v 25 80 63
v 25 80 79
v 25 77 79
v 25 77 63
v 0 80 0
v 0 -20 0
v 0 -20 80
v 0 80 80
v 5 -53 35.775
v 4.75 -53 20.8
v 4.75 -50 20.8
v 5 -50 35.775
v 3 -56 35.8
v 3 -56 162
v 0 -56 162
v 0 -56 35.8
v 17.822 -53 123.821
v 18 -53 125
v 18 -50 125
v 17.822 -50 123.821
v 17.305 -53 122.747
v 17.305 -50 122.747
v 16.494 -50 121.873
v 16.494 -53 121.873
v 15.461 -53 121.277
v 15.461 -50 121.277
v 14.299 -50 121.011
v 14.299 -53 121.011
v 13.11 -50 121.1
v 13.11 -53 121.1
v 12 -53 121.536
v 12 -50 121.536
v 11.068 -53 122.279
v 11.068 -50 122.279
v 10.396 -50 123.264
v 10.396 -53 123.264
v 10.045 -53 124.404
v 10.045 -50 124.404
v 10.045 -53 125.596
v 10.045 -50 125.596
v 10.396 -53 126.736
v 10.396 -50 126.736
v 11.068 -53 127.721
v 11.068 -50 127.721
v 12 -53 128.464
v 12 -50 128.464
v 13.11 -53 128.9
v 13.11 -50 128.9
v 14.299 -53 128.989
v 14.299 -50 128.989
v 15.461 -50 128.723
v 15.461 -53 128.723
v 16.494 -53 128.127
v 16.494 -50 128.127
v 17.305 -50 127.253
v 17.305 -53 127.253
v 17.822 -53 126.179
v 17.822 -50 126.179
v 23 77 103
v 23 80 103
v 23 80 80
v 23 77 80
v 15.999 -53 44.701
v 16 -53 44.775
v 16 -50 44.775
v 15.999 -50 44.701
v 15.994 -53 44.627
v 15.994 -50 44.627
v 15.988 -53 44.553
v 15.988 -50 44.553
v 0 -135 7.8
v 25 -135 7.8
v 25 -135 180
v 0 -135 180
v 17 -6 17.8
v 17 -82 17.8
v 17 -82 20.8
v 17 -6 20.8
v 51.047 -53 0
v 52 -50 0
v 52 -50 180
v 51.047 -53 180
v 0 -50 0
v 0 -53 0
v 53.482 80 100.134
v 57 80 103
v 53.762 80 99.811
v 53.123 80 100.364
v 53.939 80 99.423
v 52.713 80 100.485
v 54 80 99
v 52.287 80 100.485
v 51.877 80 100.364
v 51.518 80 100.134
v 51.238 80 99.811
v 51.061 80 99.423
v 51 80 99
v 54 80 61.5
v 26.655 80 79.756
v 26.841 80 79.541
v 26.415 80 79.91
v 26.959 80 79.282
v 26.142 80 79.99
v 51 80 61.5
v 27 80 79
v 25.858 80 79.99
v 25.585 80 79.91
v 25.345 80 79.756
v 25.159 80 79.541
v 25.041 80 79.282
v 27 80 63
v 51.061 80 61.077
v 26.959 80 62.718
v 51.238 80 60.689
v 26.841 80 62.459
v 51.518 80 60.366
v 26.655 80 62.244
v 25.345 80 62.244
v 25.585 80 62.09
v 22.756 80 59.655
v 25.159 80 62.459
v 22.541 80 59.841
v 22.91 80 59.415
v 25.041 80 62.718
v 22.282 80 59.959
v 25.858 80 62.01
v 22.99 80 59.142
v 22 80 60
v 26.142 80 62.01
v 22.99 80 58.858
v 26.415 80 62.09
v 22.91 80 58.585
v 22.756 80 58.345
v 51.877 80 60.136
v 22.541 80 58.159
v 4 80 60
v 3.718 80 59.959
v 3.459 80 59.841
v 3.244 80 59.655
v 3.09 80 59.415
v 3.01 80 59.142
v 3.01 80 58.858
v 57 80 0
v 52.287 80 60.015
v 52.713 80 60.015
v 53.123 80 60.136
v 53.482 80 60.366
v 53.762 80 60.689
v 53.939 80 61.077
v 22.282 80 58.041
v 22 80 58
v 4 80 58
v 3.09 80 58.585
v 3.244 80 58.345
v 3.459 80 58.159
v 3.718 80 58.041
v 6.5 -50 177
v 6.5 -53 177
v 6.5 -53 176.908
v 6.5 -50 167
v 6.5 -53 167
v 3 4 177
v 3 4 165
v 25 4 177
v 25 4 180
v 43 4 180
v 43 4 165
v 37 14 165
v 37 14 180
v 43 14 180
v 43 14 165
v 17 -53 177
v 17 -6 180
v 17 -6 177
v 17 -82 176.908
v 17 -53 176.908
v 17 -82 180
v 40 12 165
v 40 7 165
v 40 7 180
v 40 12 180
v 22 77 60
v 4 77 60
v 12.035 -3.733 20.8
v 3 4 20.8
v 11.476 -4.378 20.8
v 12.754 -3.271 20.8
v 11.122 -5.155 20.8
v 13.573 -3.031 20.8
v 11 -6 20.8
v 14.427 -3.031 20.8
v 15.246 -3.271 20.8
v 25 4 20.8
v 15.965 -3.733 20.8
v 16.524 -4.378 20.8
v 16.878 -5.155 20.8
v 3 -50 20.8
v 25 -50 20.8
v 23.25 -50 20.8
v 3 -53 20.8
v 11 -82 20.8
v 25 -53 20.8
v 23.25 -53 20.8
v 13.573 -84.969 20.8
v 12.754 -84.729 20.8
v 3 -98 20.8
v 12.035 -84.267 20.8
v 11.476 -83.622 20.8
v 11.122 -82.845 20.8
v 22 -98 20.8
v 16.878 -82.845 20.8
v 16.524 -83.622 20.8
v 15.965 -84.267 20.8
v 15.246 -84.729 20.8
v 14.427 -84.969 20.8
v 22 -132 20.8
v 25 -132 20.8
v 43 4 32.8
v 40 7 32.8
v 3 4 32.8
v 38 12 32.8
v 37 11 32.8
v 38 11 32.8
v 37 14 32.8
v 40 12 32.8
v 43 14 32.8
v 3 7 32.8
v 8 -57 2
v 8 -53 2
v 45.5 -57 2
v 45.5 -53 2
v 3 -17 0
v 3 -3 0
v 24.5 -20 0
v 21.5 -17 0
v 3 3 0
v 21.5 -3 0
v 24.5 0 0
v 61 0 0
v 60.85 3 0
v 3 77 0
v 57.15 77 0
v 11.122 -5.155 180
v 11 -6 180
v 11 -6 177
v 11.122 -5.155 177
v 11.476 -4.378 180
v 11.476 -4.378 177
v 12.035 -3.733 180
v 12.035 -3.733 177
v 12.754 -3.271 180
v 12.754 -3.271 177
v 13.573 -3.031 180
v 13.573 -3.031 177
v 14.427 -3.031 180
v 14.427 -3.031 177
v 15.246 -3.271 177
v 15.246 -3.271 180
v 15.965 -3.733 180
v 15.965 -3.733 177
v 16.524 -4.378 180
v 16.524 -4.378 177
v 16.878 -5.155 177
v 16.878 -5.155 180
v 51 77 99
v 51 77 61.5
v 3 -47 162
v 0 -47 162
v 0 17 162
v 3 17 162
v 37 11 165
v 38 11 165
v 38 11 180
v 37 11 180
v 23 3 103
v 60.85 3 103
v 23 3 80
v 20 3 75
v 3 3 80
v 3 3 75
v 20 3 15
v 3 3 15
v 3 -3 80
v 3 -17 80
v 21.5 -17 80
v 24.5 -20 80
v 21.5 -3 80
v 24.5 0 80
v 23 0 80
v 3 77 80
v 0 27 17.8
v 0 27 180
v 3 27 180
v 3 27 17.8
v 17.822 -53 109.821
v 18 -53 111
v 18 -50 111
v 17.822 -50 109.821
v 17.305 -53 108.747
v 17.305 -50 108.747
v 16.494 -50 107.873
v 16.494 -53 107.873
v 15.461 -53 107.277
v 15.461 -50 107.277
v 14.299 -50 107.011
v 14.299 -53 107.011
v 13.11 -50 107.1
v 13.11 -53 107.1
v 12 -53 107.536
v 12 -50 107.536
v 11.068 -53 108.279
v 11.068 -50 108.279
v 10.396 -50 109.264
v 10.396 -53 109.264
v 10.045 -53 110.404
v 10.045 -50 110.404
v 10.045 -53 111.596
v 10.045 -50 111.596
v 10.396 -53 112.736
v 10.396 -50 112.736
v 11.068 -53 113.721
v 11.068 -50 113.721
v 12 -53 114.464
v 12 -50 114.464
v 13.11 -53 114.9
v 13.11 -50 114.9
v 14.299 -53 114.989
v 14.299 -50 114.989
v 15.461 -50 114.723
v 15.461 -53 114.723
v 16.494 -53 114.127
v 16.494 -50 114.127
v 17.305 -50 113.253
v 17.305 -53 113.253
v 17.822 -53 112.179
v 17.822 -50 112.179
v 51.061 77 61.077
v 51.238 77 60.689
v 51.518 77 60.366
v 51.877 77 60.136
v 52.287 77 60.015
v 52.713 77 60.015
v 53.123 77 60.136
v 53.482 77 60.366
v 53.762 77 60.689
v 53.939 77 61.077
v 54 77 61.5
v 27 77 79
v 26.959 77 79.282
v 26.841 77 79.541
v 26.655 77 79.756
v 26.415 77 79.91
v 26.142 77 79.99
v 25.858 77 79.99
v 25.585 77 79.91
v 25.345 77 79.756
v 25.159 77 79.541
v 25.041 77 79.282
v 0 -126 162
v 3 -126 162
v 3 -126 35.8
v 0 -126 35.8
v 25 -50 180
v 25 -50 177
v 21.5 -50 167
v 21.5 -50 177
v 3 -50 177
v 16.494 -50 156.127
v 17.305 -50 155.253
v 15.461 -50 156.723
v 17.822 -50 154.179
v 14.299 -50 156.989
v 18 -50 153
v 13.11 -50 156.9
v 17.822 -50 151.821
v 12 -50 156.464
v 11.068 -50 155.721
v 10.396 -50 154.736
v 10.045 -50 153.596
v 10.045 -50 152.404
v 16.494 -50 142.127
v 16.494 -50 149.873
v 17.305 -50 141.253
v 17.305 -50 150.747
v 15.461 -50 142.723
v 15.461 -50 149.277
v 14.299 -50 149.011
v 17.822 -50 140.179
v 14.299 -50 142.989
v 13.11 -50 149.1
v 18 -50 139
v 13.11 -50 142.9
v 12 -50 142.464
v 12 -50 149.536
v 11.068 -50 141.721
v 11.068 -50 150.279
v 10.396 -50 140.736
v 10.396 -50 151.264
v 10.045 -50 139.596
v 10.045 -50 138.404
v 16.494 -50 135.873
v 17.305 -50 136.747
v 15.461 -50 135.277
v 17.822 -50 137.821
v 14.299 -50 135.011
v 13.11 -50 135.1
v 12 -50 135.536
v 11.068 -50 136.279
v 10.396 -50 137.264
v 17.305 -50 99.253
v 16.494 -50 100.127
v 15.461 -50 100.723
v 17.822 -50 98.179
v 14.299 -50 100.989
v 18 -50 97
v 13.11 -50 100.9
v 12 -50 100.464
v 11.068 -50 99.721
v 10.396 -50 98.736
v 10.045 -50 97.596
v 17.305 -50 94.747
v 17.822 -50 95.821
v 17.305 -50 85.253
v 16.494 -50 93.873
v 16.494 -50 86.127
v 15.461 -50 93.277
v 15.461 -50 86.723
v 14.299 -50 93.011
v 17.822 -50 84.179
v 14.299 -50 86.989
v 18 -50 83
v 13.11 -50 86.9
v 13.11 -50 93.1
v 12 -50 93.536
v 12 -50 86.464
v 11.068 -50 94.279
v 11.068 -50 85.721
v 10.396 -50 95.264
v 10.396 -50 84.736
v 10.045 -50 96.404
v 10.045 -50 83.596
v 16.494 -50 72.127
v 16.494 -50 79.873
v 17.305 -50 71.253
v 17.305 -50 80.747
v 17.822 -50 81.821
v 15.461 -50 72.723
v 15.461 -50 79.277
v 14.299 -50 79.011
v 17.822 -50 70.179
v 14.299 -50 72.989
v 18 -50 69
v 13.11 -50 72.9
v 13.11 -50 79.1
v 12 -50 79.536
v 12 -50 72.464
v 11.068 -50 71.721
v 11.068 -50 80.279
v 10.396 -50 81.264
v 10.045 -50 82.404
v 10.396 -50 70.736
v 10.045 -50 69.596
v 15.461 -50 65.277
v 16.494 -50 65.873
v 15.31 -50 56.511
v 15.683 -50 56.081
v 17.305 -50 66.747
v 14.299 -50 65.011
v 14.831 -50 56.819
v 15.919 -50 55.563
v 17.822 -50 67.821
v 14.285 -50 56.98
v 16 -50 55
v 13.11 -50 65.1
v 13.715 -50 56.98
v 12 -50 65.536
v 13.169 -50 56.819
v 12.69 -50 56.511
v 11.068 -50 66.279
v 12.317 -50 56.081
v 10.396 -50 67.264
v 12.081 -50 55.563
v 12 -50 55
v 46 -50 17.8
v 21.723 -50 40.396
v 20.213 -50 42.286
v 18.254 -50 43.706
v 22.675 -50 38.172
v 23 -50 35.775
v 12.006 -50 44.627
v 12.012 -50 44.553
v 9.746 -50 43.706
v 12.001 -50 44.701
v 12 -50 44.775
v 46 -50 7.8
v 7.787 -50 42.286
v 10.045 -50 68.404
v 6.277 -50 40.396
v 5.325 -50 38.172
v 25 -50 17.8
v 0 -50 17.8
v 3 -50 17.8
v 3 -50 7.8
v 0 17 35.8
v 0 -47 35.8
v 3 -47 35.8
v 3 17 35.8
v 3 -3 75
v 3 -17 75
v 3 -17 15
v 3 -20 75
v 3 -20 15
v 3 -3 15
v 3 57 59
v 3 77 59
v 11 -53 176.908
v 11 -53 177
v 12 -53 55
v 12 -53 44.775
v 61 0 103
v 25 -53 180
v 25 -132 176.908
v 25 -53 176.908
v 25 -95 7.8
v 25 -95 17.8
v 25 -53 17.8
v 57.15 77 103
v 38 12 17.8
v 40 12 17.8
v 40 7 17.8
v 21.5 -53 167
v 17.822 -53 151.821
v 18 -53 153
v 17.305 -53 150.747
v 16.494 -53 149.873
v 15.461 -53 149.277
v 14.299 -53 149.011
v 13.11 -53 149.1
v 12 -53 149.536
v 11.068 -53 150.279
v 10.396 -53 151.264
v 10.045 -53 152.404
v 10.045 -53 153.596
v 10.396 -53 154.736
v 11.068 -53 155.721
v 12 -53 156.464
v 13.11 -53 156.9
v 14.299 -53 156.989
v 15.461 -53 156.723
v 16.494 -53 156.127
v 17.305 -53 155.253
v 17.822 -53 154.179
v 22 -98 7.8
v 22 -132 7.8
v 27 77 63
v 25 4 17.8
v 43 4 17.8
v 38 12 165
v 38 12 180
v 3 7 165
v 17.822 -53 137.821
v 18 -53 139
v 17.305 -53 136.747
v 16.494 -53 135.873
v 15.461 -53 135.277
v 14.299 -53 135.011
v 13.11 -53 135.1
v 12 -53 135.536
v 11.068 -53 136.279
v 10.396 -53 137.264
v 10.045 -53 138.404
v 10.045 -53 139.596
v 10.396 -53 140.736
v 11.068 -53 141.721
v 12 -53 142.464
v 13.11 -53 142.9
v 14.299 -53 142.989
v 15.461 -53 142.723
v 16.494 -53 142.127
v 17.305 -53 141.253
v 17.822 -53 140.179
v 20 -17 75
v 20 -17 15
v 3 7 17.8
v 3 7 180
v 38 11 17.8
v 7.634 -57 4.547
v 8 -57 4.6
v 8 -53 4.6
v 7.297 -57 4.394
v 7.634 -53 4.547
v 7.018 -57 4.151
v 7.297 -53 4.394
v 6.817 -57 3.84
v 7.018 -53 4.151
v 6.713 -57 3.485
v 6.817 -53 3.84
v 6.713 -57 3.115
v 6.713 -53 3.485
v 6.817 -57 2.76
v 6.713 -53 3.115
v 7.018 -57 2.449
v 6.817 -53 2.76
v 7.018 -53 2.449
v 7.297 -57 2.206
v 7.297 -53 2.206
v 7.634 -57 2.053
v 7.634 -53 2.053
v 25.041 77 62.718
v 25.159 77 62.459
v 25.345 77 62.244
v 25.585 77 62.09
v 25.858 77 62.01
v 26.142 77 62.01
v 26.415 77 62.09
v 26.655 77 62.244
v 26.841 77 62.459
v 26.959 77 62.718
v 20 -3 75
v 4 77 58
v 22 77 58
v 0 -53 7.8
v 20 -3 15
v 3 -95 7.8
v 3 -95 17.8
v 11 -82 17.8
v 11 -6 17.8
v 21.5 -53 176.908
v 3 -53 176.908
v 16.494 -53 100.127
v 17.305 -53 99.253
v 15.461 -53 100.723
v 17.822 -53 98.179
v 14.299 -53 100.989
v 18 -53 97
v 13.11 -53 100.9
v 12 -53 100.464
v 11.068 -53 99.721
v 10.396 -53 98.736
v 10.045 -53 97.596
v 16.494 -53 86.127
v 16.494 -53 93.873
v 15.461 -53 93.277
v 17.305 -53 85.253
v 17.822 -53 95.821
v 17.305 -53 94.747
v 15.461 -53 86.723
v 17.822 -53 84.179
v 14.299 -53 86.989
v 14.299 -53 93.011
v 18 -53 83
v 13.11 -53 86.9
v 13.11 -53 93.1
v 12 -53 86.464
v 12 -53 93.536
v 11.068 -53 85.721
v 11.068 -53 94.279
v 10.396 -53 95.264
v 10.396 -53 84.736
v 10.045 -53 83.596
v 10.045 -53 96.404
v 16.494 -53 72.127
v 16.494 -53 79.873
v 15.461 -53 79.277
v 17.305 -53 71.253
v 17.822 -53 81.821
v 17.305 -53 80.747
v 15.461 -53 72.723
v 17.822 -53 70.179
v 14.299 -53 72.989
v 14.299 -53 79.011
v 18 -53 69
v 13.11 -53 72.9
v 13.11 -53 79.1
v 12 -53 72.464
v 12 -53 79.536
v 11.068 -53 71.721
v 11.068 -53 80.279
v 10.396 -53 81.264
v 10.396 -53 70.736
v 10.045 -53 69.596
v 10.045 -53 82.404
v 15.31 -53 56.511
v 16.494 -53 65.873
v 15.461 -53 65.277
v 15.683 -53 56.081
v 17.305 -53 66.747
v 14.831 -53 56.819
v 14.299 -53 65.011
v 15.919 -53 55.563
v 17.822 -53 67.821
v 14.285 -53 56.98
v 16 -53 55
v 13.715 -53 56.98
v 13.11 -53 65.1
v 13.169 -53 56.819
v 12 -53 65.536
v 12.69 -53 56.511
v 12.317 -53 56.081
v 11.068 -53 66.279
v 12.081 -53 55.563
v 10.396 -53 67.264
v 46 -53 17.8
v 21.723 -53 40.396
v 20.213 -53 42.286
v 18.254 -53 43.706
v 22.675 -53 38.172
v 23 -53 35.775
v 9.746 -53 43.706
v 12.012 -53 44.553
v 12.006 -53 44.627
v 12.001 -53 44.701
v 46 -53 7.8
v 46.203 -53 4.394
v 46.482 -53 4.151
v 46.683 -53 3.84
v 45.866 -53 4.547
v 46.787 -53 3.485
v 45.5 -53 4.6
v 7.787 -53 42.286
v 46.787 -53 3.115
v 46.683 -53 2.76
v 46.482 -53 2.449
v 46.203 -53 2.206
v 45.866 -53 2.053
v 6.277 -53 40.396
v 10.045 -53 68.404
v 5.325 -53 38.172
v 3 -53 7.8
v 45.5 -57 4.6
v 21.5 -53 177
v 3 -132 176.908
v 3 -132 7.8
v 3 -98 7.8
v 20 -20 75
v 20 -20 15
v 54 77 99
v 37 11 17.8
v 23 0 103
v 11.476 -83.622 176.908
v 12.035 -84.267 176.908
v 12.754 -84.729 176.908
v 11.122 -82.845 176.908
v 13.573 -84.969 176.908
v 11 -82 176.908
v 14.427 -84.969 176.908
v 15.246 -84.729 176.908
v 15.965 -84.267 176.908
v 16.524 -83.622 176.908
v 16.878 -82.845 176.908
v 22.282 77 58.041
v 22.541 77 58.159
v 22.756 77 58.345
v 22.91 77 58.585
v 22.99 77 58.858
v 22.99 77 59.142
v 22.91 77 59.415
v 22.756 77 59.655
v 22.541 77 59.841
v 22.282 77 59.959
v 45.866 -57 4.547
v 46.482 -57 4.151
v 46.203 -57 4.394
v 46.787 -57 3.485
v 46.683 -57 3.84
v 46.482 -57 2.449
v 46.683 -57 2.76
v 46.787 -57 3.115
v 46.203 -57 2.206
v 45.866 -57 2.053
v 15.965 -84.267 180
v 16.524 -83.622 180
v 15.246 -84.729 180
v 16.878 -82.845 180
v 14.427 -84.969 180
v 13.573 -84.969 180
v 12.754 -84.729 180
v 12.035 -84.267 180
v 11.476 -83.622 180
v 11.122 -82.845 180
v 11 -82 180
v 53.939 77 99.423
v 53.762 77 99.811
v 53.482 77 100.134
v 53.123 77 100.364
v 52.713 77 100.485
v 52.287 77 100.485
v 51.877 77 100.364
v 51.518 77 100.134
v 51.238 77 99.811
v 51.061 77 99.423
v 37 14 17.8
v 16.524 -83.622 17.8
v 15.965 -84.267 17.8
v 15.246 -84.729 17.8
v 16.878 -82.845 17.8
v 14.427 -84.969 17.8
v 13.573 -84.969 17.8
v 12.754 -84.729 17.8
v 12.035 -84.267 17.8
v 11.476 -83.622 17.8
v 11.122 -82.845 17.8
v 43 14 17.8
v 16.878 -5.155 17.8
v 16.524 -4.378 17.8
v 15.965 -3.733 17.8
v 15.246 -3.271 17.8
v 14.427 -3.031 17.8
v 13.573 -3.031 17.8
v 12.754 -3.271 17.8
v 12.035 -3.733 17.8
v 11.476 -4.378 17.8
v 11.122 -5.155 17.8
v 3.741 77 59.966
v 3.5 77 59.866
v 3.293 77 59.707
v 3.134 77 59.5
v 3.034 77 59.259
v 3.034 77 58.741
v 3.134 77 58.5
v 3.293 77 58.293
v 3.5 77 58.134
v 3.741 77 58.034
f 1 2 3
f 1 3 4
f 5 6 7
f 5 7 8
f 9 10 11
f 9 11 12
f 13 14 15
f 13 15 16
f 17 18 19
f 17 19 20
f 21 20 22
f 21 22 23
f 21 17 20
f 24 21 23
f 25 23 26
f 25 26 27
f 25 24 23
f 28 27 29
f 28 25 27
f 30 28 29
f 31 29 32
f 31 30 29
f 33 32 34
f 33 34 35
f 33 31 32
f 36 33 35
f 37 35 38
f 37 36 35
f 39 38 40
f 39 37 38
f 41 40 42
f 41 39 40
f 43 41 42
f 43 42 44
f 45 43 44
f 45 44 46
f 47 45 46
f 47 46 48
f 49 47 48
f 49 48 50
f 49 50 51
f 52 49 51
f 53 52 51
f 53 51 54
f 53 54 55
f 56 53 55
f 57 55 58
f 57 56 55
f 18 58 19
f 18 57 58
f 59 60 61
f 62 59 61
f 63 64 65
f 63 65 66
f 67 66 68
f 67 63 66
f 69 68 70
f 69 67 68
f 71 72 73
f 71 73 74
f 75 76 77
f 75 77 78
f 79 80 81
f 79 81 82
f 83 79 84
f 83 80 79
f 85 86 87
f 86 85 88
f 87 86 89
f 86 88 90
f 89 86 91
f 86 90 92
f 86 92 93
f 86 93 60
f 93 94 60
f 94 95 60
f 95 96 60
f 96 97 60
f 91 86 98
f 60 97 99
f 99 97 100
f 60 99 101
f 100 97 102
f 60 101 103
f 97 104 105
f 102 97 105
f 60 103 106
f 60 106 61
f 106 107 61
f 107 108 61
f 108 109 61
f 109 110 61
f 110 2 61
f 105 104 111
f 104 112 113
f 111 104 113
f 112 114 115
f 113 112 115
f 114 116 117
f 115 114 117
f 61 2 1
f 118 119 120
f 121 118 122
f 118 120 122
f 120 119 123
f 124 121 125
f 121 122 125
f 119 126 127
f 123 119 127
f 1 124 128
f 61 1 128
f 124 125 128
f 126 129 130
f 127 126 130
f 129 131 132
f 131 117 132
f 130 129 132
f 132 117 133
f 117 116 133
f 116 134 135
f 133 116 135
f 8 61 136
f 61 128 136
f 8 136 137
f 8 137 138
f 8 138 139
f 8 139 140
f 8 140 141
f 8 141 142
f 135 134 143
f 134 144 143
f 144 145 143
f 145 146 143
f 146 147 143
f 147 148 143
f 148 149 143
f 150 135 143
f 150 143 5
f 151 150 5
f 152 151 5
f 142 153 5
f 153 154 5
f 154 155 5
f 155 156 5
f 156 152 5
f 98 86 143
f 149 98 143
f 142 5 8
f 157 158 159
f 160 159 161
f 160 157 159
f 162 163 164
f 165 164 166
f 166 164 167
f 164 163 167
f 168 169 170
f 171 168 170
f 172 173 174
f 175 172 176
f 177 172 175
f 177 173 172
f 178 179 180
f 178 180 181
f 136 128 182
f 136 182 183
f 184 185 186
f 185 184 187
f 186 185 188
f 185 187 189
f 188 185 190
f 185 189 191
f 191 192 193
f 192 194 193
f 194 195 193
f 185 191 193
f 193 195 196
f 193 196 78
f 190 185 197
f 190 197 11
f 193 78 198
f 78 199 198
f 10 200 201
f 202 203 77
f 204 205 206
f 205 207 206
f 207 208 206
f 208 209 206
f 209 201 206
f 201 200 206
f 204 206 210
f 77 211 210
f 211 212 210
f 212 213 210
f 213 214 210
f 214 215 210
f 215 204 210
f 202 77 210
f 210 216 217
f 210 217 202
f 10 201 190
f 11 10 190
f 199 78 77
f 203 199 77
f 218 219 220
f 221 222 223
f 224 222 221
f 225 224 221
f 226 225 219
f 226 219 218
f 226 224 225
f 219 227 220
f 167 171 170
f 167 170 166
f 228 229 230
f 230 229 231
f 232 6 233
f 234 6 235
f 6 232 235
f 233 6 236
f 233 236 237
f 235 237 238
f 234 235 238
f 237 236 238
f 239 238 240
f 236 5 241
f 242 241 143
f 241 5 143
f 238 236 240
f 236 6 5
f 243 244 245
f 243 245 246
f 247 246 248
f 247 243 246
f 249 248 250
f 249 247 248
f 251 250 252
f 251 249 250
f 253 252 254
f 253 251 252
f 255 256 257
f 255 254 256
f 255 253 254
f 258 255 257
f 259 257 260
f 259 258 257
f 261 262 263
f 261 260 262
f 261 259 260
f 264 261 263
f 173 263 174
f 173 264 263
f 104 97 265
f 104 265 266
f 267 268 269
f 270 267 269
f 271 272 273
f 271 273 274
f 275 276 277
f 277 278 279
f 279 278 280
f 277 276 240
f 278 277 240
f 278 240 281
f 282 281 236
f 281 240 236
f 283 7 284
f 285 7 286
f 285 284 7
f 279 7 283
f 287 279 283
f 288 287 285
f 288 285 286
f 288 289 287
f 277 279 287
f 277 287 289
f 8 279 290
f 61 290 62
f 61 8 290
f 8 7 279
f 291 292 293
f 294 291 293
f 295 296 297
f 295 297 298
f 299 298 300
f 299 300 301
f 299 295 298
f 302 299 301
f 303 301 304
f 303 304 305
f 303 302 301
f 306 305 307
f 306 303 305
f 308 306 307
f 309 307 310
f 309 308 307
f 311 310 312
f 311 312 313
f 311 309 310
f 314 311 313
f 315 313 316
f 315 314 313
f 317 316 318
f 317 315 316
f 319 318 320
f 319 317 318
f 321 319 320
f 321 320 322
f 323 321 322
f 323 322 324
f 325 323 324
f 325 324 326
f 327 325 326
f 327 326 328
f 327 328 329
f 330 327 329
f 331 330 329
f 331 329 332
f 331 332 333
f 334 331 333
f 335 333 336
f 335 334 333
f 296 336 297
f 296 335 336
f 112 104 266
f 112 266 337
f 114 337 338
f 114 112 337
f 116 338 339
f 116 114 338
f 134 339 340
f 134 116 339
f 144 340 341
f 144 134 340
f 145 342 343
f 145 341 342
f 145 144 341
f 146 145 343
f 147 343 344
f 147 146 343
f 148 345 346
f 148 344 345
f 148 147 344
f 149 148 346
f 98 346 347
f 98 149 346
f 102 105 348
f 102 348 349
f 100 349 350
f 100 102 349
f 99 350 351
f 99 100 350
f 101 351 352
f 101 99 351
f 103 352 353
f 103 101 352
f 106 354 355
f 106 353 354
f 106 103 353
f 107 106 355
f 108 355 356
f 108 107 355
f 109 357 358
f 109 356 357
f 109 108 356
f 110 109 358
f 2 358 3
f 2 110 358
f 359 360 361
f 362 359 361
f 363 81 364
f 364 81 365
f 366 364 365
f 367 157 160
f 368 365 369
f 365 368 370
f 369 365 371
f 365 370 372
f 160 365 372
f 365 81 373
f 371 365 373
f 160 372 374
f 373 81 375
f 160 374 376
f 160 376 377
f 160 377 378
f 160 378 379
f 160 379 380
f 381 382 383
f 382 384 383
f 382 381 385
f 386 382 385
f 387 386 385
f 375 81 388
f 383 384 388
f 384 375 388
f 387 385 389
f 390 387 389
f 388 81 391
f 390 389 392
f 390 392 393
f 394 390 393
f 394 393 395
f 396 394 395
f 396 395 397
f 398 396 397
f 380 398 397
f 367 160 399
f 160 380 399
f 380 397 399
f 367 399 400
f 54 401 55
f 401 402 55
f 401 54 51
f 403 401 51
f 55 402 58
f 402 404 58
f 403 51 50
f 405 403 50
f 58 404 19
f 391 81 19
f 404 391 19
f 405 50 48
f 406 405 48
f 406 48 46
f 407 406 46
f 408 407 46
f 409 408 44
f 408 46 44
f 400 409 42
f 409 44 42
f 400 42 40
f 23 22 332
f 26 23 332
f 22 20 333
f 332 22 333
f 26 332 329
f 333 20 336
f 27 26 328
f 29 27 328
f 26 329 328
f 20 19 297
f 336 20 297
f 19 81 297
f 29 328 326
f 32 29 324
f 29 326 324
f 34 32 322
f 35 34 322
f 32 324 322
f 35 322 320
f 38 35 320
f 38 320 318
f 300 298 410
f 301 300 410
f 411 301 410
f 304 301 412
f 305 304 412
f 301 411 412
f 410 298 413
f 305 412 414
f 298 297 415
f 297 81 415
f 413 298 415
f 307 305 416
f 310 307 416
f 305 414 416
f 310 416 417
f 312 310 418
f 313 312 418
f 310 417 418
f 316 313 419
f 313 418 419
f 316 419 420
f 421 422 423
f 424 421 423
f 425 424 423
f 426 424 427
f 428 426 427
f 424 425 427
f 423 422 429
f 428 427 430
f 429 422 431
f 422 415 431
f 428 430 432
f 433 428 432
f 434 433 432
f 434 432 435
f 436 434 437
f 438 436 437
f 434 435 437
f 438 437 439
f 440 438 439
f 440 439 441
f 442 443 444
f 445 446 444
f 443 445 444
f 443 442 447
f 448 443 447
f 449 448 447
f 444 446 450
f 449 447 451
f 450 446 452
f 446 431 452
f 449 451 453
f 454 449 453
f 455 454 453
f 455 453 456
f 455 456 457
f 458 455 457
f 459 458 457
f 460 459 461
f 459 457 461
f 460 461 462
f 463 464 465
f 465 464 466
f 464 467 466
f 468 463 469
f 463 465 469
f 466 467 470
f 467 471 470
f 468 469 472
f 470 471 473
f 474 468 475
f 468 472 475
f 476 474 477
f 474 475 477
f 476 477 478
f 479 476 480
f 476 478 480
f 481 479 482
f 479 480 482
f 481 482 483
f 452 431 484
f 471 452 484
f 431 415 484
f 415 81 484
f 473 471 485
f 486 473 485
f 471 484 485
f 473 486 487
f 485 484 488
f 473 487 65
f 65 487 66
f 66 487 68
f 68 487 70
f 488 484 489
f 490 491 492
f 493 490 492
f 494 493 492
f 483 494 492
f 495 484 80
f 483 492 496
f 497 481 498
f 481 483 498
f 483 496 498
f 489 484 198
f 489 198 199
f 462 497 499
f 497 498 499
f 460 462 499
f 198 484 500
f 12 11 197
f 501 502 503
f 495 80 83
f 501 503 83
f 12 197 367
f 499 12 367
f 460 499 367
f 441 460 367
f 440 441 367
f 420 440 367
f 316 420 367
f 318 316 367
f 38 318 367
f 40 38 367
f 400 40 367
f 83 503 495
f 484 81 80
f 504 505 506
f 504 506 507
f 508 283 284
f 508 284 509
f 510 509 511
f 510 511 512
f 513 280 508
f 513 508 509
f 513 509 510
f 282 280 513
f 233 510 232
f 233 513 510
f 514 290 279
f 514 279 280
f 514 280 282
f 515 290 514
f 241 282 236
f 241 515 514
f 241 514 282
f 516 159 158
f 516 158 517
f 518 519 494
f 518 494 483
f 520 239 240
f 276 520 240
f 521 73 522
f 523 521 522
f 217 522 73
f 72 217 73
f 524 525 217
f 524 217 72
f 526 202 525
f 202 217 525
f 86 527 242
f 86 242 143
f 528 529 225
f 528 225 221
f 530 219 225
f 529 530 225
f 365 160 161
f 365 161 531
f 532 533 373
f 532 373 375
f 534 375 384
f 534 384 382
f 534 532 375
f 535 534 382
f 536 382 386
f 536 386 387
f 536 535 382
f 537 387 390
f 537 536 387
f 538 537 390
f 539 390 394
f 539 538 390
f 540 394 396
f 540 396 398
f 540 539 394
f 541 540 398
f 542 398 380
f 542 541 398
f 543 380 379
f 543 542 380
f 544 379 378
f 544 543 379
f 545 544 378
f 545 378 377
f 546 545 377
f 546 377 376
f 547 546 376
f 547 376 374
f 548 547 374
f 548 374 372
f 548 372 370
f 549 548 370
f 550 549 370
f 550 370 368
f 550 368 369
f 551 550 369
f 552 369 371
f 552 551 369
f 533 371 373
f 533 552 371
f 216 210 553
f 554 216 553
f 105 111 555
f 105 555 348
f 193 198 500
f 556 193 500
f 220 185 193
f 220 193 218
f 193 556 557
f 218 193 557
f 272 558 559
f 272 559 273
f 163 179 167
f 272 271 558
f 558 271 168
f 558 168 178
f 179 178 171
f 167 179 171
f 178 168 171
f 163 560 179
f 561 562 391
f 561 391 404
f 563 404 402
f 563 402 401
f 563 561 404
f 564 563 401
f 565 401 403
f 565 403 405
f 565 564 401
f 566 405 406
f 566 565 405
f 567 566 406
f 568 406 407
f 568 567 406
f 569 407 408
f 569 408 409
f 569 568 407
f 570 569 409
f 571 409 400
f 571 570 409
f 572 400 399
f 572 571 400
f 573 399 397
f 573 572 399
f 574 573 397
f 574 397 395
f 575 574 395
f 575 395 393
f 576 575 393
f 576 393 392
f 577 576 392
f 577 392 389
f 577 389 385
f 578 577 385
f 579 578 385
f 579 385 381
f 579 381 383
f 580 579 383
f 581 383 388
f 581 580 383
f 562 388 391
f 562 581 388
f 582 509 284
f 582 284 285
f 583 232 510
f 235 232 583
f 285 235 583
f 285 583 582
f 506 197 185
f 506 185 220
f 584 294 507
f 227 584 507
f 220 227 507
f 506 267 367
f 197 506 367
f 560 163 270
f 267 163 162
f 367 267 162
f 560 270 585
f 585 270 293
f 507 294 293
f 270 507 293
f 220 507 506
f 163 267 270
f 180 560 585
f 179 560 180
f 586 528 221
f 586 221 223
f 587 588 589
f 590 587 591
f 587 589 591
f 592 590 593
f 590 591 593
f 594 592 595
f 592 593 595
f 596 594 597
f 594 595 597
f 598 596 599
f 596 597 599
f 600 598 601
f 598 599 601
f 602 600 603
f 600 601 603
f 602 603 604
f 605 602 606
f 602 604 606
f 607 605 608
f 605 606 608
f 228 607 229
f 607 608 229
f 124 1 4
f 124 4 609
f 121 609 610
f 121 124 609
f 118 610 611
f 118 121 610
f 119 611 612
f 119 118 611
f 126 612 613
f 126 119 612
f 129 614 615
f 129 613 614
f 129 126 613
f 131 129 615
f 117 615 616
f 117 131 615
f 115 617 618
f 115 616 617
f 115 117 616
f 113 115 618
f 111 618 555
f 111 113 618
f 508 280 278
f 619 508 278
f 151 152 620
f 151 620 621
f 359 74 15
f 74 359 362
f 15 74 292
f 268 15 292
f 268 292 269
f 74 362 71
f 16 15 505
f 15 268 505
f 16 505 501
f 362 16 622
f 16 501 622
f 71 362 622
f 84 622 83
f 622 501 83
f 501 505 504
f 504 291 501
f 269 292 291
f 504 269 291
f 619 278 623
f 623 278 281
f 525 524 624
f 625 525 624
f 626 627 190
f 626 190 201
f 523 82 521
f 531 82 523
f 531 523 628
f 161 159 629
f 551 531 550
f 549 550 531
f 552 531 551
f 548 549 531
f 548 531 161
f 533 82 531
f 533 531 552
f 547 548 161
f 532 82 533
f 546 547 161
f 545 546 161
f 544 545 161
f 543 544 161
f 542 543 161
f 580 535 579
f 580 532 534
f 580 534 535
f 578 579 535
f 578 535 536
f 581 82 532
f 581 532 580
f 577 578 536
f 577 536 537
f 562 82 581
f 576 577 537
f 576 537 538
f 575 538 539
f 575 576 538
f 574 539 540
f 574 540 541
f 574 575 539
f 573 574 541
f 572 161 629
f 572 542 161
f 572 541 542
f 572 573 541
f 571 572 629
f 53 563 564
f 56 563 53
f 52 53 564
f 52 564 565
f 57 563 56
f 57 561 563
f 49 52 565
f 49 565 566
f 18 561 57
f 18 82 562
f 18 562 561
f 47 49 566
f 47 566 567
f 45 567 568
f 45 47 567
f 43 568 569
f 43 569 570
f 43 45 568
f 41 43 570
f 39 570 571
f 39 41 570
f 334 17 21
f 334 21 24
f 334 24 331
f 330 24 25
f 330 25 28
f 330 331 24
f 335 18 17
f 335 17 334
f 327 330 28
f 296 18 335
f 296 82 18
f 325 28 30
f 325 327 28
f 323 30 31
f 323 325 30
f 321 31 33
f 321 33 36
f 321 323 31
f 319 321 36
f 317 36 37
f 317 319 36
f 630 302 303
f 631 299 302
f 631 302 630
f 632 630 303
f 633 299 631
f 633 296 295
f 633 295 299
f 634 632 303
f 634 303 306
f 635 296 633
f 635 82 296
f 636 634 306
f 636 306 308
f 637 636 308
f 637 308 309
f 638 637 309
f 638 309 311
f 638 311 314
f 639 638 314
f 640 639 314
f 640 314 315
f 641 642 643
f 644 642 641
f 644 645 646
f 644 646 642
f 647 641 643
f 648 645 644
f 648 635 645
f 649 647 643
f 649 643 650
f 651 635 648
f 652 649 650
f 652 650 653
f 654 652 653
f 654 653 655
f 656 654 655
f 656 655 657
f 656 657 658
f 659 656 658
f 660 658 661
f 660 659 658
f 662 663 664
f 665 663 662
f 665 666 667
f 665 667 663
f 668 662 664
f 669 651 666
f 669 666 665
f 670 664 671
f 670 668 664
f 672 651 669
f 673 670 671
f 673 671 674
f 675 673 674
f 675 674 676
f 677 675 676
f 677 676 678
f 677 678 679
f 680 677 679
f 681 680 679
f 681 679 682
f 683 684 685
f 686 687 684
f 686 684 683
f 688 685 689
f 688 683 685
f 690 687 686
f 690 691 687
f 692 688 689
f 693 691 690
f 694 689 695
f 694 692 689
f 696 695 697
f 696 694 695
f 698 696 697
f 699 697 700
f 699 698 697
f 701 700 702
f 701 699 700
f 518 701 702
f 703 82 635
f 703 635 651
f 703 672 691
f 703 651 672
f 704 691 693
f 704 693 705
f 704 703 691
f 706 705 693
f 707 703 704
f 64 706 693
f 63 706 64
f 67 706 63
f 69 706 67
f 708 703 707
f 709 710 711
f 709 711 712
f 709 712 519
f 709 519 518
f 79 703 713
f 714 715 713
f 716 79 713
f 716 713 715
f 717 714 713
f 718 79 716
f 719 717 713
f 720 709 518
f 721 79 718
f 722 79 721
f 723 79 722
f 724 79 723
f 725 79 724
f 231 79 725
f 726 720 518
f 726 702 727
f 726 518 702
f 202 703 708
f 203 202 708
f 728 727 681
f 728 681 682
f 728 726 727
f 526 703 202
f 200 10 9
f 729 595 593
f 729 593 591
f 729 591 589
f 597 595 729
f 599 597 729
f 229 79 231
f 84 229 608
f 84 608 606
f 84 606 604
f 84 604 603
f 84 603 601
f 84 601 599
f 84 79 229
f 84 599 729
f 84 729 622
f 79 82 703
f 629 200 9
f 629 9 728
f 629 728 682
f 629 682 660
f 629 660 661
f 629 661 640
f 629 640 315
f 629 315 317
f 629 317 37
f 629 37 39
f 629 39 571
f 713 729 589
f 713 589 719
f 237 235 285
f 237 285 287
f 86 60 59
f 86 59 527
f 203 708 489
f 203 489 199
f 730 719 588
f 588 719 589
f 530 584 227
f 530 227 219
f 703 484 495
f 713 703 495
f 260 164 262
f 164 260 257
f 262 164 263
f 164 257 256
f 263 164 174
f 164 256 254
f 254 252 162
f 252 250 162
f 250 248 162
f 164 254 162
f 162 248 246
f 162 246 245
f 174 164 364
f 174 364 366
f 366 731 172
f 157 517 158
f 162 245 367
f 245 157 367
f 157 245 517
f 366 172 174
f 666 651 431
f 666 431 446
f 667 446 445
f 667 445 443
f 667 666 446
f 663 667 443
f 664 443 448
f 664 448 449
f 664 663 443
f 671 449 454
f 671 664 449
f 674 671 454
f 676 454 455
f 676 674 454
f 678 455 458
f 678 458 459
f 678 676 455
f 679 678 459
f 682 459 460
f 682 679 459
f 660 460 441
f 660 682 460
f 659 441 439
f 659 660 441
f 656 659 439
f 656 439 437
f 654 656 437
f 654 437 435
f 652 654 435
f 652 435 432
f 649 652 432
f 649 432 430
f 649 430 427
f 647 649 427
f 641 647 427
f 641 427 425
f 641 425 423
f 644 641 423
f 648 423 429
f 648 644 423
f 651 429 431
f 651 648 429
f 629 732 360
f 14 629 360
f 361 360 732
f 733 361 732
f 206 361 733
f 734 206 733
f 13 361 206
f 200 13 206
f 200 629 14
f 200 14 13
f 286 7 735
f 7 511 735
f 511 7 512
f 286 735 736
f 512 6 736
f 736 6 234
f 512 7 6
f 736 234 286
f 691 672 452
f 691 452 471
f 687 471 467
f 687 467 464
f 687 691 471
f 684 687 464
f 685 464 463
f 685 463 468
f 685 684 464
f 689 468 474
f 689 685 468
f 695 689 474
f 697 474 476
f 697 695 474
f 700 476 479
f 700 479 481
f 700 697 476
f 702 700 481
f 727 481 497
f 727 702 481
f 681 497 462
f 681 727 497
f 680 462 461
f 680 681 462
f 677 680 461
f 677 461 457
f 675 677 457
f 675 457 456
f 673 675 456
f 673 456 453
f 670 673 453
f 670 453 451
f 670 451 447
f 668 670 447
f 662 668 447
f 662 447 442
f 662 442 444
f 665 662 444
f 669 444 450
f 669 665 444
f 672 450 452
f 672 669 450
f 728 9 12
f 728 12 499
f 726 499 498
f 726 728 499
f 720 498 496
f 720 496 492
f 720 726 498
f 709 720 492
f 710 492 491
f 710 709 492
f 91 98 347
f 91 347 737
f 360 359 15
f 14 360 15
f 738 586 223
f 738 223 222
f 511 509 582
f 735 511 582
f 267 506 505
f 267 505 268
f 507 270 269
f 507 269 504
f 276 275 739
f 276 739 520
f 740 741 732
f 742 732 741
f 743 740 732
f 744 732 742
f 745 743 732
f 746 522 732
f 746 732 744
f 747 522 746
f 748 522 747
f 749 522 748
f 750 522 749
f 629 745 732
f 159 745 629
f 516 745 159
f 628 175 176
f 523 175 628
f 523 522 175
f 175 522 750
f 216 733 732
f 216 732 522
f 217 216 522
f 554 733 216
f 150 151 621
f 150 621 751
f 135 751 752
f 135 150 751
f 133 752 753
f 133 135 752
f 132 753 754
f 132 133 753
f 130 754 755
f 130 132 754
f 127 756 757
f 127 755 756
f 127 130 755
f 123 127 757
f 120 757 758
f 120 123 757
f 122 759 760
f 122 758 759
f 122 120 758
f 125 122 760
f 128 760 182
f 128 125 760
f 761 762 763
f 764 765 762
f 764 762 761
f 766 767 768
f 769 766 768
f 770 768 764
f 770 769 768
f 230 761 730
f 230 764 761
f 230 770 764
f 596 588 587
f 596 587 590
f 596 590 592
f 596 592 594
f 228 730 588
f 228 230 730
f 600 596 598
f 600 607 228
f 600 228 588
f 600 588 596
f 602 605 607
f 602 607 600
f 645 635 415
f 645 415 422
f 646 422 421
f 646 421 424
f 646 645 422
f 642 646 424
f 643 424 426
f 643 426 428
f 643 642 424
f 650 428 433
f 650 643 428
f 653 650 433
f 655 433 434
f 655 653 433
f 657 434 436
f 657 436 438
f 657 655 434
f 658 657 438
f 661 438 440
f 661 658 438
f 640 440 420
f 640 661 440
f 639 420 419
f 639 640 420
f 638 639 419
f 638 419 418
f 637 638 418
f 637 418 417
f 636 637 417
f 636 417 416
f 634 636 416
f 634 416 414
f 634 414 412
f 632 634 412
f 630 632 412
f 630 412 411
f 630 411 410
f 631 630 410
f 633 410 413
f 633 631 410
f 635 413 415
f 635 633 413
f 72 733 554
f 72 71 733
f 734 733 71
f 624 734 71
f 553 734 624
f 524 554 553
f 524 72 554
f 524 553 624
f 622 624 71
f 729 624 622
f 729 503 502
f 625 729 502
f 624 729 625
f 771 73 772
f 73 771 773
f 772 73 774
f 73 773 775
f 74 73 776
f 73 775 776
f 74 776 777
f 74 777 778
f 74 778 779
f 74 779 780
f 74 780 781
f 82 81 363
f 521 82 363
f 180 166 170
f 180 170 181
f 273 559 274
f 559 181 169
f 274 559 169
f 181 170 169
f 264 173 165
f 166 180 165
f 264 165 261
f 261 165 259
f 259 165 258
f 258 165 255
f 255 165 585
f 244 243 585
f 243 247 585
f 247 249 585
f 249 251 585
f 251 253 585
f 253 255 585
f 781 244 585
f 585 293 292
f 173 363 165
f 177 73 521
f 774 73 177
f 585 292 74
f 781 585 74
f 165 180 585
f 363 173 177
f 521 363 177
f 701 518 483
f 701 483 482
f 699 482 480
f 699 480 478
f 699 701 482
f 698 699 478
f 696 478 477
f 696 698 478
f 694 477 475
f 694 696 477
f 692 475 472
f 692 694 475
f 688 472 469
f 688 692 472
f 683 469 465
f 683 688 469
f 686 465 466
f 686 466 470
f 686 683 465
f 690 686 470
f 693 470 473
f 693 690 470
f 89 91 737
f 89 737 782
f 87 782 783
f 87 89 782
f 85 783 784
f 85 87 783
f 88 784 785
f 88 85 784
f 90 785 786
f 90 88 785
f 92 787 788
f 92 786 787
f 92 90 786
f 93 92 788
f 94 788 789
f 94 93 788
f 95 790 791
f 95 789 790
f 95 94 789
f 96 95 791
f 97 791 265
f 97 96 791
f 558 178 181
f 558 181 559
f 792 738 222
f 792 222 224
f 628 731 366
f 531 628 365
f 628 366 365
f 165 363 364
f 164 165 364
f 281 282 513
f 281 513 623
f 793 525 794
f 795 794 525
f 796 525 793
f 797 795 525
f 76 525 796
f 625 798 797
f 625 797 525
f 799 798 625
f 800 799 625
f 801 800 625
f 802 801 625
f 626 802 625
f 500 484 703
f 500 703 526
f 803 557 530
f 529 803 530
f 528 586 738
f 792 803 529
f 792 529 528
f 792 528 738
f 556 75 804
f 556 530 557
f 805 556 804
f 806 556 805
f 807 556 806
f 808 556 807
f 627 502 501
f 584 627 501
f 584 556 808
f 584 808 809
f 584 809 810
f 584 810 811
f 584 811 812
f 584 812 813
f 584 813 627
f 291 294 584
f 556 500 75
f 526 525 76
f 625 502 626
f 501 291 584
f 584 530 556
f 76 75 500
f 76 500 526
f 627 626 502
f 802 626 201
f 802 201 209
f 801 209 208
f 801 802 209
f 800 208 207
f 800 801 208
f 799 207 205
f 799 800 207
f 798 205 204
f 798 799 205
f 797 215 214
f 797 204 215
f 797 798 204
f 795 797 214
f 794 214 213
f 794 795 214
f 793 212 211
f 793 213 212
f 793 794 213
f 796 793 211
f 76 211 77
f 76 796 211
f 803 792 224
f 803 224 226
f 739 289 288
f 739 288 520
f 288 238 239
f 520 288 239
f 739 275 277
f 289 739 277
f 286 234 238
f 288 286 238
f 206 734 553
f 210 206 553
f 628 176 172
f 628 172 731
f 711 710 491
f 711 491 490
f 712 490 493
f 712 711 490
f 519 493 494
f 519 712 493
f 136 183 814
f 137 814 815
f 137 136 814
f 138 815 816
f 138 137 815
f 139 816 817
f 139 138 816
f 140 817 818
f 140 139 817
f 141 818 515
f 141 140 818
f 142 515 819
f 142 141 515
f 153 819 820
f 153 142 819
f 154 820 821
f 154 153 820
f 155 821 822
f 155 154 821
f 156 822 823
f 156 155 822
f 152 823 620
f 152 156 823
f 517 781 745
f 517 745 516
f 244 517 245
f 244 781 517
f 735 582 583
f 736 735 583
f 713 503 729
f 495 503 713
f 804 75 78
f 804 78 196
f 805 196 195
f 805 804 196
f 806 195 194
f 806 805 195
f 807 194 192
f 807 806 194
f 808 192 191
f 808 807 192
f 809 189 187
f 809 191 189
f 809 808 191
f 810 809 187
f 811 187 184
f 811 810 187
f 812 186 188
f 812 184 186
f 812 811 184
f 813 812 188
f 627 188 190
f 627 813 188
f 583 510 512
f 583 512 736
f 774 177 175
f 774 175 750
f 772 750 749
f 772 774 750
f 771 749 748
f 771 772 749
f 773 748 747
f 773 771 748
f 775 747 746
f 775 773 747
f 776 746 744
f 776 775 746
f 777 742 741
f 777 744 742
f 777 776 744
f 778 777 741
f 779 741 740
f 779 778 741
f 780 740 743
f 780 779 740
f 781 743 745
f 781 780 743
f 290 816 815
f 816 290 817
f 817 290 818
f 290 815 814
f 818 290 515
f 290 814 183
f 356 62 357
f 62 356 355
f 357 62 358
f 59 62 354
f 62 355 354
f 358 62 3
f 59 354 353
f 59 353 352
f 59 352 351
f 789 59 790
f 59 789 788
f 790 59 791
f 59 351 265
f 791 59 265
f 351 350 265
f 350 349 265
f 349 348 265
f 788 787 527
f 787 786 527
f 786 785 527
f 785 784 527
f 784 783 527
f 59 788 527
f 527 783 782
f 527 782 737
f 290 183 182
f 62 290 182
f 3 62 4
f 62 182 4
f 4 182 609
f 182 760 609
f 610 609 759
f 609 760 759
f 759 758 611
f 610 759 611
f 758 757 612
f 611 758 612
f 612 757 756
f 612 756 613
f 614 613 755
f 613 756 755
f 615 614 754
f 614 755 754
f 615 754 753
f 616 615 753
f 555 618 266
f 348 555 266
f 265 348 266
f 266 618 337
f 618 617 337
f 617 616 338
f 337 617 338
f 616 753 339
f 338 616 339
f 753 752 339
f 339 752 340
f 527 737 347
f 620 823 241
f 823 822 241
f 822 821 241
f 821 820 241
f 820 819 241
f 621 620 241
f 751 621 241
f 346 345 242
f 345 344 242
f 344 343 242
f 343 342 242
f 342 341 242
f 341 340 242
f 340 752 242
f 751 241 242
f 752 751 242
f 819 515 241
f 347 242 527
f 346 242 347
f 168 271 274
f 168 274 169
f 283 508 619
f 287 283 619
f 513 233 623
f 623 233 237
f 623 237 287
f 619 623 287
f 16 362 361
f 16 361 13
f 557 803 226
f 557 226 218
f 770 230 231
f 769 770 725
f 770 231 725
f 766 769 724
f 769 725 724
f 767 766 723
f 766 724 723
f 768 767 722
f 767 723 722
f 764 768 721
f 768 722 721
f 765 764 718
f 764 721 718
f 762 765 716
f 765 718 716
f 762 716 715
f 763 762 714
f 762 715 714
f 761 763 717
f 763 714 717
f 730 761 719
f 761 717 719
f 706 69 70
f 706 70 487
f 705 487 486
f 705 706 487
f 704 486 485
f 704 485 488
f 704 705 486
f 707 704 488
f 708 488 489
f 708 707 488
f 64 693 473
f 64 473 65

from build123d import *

# Parameters (mm, degrees)
EXTRUDE_1_DEPTH           = 103
EXTRUDE_2_DEPTH           = 180
SKETCH_4_W                = 23
SKETCH_4_H                = 23
CUT_EXTRUDE_5_DEPTH       = 80
SKETCH_1_4_W              = 24.5
SKETCH_1_4_H              = 20
SKETCH_1_4_W_2            = 18.5
SKETCH_1_4_H_2            = 14
EXTRUDE_3_DEPTH           = 80
SKETCH_5_W                = 17
SKETCH_5_H                = 60
CUT_EXTRUDE_6_DEPTH       = 23
CUT_EXTRUDE_7_DEPTH       = 23
CUT_EXTRUDE_8_DEPTH       = 23
SKETCH_8_W                = 25
SKETCH_8_H                = 85
EXTRUDE_4_DEPTH           = 5
SKETCH_9_W                = 0.952941176
SKETCH_9_H                = 3
CUT_EXTRUDE_9_DEPTH       = 200
EXTRUDE_5_DEPTH           = 7
CUT_EXTRUDE_12_DEPTH      = 234.122285507
CUT_EXTRUDE_12_DEPTH_BACK = 25
SKETCH_13_W               = 7.8
SKETCH_13_H               = 3
CUT_EXTRUDE_14_DEPTH      = 234.122285507
CUT_EXTRUDE_14_DEPTH_BACK = 3
SKETCH_13_5_W             = 7.8
SKETCH_13_5_H             = 79
SKETCH_15_W               = 25
SKETCH_15_H               = 40
SKETCH_15_W_2             = 19
SKETCH_15_H_2             = 34
EXTRUDE_6_DEPTH           = 10
SKETCH_16_W               = 22
SKETCH_16_H               = 100
EXTRUDE_7_DEPTH           = 3
SKETCH_20_W               = 43
SKETCH_20_H               = 10
CUT_EXTRUDE_15_DEPTH      = 3
SKETCH_24_W               = 3
SKETCH_24_H               = 52
EXTRUDE_8_DEPTH           = 3
SKETCH_25_W               = 25
SKETCH_25_H               = 137
EXTRUDE_9_DEPTH           = 3
SKETCH_28_W               = 15
SKETCH_28_H               = 10
CUT_EXTRUDE_16_DEPTH      = 3
SKETCH_29_W               = 1.908461085
SKETCH_29_H               = 79
CUT_EXTRUDE_17_DEPTH      = 22
CUT_EXTRUDE_18_DEPTH      = 10
CUT_EXTRUDE_19_DEPTH      = 10
SKETCH_30_W               = 15
SKETCH_30_H               = 10
CUT_EXTRUDE_20_DEPTH      = 10
SKETCH_31_W               = 3
SKETCH_31_H               = 34
EXTRUDE_10_DEPTH          = 3
SKETCH_32_W               = 156.2
SKETCH_32_H               = 52
EXTRUDE_11_DEPTH          = 3
EXTRUDE_14_DEPTH          = 5
SKETCH_36_W               = 3
SKETCH_36_H               = 162.2
EXTRUDE_15_DEPTH          = 20
SKETCH_37_W               = 29
SKETCH_37_H               = 162.2
EXTRUDE_16_DEPTH          = 3
SKETCH_37_3_W             = 3
SKETCH_37_3_H             = 162.2
EXTRUDE_17_DEPTH          = 3
CUT_EXTRUDE_START         = -3
CUT_EXTRUDE_23_OUTLINE_R  = 4
CUT_EXTRUDE_23_DEPTH      = 3
EXTRUDE_18_DEPTH          = 162.2
SKETCH_42_W               = 29
SKETCH_42_H               = 132.2
CUT_EXTRUDE_24_DEPTH      = 28
SKETCH_43_W               = 11
SKETCH_43_H               = 12
EXTRUDE_20_DEPTH          = 3
SKETCH_44_W               = 150.108461085
SKETCH_44_H               = 73
CUT_EXTRUDE_26_DEPTH      = 10
SKETCH_47_W               = 156.2
SKETCH_47_H               = 7
EXTRUDE_21_DEPTH          = 3
SKETCH_48_W               = 12
SKETCH_48_H               = 48
SKETCH_48_H_2             = 73
SKETCH_48_W_2             = 11.908461085
EXTRUDE_22_DEPTH          = 3
SKETCH_49_W               = 126.2
SKETCH_49_H               = 3
EXTRUDE_23_DEPTH          = 3


# Read off the part's stored shape, not the designer's step: 컷-돌출23
with BuildPart() as part:
    # 스케치1 → 보스-돌출1 (new body)
    with BuildSketch(Plane.XY):
        Polygon((0, 0), (61, 0), (60.85, 3), (3, 3), (3, 77), (57.15, 77), (57, 80), (0, 80), align=None)
    extrude(amount=EXTRUDE_1_DEPTH)

    # 스케치4 → 컷-돌출5 (cut)
    with BuildSketch(Plane(origin=(0, 80, 0), x_dir=(1, 0, 0), z_dir=(0, 1, 0))):
        with Locations((11.5, -91.5)):
            Rectangle(SKETCH_4_W, SKETCH_4_H)
    extrude(amount=-CUT_EXTRUDE_5_DEPTH, mode=Mode.SUBTRACT)

    # 스케치1<4> → 보스-돌출3 (add)
    with BuildSketch(Plane.XY):
        with Locations((12.25, -10)):
            Rectangle(SKETCH_1_4_W, SKETCH_1_4_H)
        with Locations((12.25, -10)):
            Rectangle(SKETCH_1_4_W_2, SKETCH_1_4_H_2, mode=Mode.SUBTRACT)
    extrude(amount=EXTRUDE_3_DEPTH)

    # 스케치5 → 컷-돌출6 (cut)
    with BuildSketch(Plane(origin=(0, 3, 0), x_dir=(1, 0, 0), z_dir=(0, 1, 0))):
        with Locations((11.5, -45)):
            Rectangle(SKETCH_5_W, SKETCH_5_H)
    extrude(amount=-CUT_EXTRUDE_6_DEPTH, mode=Mode.SUBTRACT)

    # 스케치6 → 컷-돌출7 (cut)
    with BuildSketch(Plane(origin=(0, 80, 0), x_dir=(1, 0, 0), z_dir=(0, 1, 0))):
        with BuildLine():
            Line((27, -63), (27, -79))
            ThreePointArc((27, -79), (26, -80), (25, -79))
            Line((25, -79), (25, -63))
            ThreePointArc((25, -63), (26, -62), (27, -63))
        make_face()
        with BuildLine():
            Line((22, -60), (4, -60))
            ThreePointArc((4, -60), (3, -59), (4, -58))
            Line((4, -58), (22, -58))
            ThreePointArc((22, -58), (23, -59), (22, -60))
        make_face()
    extrude(amount=-CUT_EXTRUDE_7_DEPTH, mode=Mode.SUBTRACT)

    # 스케치7 → 컷-돌출8 (cut)
    with BuildSketch(Plane(origin=(0, 80, 0), x_dir=(1, 0, 0), z_dir=(0, 1, 0))):
        with BuildLine():
            Line((54, -61.5), (54, -99))
            ThreePointArc((54, -99), (52.5, -100.5), (51, -99))
            Line((51, -99), (51, -61.5))
            ThreePointArc((51, -61.5), (52.5, -60), (54, -61.5))
        make_face()
    extrude(amount=-CUT_EXTRUDE_8_DEPTH, mode=Mode.SUBTRACT)


with BuildPart() as body_2:
    # 스케치1<3> → 보스-돌출2 (new body)
    with BuildSketch(Plane.XY):
        Polygon((0, -50), (52, -50), (51.047058824, -53), (3, -53), (3, -132), (25.952941176, -132), (25, -135), (0, -135), align=None)
    extrude(amount=EXTRUDE_2_DEPTH)

    # 스케치8 → 보스-돌출4 (add)
    with BuildSketch(Plane.XY.offset(180)):
        with Locations((12.5, -92.5)):
            Rectangle(SKETCH_8_W, SKETCH_8_H)
    extrude(amount=-EXTRUDE_4_DEPTH)

    # 스케치9 → 컷-돌출9 (cut)
    with BuildSketch(Plane.XY.offset(180)):
        with Locations((25.476470588, -133.5)):
            Rectangle(SKETCH_9_W, SKETCH_9_H)
    extrude(amount=-CUT_EXTRUDE_9_DEPTH, mode=Mode.SUBTRACT)

    # 스케치12 → 보스-돌출5 (add)
    with BuildSketch(Plane(origin=(0, -50, 0), x_dir=(1, 0, 0), z_dir=(0, 1, 0))):
        with BuildLine():
            Line((8, -2), (45.5, -2))
            ThreePointArc((45.5, -2), (46.8, -3.3), (45.5, -4.6))
            Line((45.5, -4.6), (8, -4.6))
            ThreePointArc((8, -4.6), (6.7, -3.3), (8, -2))
        make_face()
    extrude(amount=-EXTRUDE_5_DEPTH)

    # 스케치13 → 컷-돌출12 (cut, two sides: drawn at the far end of the back side and taken through both)
    with BuildSketch(Plane.ZY.offset(-CUT_EXTRUDE_12_DEPTH_BACK)):
        with Locations((3.9, -133.5)):
            Rectangle(SKETCH_13_W, SKETCH_13_H)
    extrude(amount=CUT_EXTRUDE_12_DEPTH + CUT_EXTRUDE_12_DEPTH_BACK, mode=Mode.SUBTRACT)

    # 스케치13<5> → 컷-돌출14 (cut, two sides: drawn at the far end of the back side and taken through both)
    with BuildSketch(Plane.ZY.offset(-CUT_EXTRUDE_14_DEPTH_BACK)):
        with Locations((3.9, -92.5)):
            Rectangle(SKETCH_13_5_W, SKETCH_13_5_H)
    extrude(amount=CUT_EXTRUDE_14_DEPTH + CUT_EXTRUDE_14_DEPTH_BACK, mode=Mode.SUBTRACT)

    # 스케치15 → 보스-돌출6 (add)
    with BuildSketch(Plane(origin=(0, 0, 7.8), x_dir=(-1, 0, 0), z_dir=(0, 0, -1))):
        with Locations((-12.5, -115)):
            Rectangle(SKETCH_15_W, SKETCH_15_H)
        with Locations((-12.5, -115)):
            Rectangle(SKETCH_15_W_2, SKETCH_15_H_2, mode=Mode.SUBTRACT)
    extrude(amount=-EXTRUDE_6_DEPTH)

    # 스케치16 → 보스-돌출7 (add)
    with BuildSketch(Plane.XY.offset(17.8)):
        with Locations((14, -48)):
            Rectangle(SKETCH_16_W, SKETCH_16_H)
    extrude(amount=EXTRUDE_7_DEPTH)

    # 스케치20 → 컷-돌출15 (cut)
    with BuildSketch(Plane(origin=(0, -50, 0), x_dir=(1, 0, 0), z_dir=(0, 1, 0))):
        with Locations((24.5, -12.8)):
            Rectangle(SKETCH_20_W, SKETCH_20_H)
    extrude(amount=-CUT_EXTRUDE_15_DEPTH, mode=Mode.SUBTRACT)

    # 스케치24 → 보스-돌출8 (add)
    with BuildSketch(Plane.ZY.offset(-3)):
        with Locations((19.3, -24)):
            Rectangle(SKETCH_24_W, SKETCH_24_H)
    extrude(amount=EXTRUDE_8_DEPTH)

    # 스케치25 → 보스-돌출9 (add)
    with BuildSketch(Plane.XY.offset(180)):
        with Locations((12.5, -66.5)):
            Rectangle(SKETCH_25_W, SKETCH_25_H)
    extrude(amount=-EXTRUDE_9_DEPTH)

    # 스케치28 → 컷-돌출16 (cut)
    with BuildSketch(Plane(origin=(0, -50, 0), x_dir=(1, 0, 0), z_dir=(0, 1, 0))):
        with Locations((14, -172)):
            Rectangle(SKETCH_28_W, SKETCH_28_H)
    extrude(amount=-CUT_EXTRUDE_16_DEPTH, mode=Mode.SUBTRACT)

    # 스케치29 → 컷-돌출17 (cut)
    with BuildSketch(Plane(origin=(25, 0, 0), x_dir=(0, 0, -1), z_dir=(1, 0, 0))):
        with Locations((-175.954230542, -92.5)):
            Rectangle(SKETCH_29_W, SKETCH_29_H)
    extrude(amount=-CUT_EXTRUDE_17_DEPTH, mode=Mode.SUBTRACT)

    # 스케치26 → 컷-돌출18 (cut)
    with BuildSketch(Plane.XY.offset(180)):
        with BuildLine():
            Line((17, -6), (17, -82))
            ThreePointArc((17, -82), (14, -85), (11, -82))
            Line((11, -82), (11, -6))
            ThreePointArc((11, -6), (14, -3), (17, -6))
        make_face()
    extrude(amount=-CUT_EXTRUDE_18_DEPTH, mode=Mode.SUBTRACT)

    # 스케치21 → 컷-돌출19 (cut)
    with BuildSketch(Plane(origin=(0, 0, 17.8), x_dir=(-1, 0, 0), z_dir=(0, 0, -1))):
        with BuildLine():
            Line((-17, -82), (-17, -6))
            ThreePointArc((-17, -6), (-14, -3), (-11, -6))
            Line((-11, -6), (-11, -82))
            ThreePointArc((-11, -82), (-14, -85), (-17, -82))
        make_face()
    extrude(amount=-CUT_EXTRUDE_19_DEPTH, mode=Mode.SUBTRACT)

    # 스케치30 → 컷-돌출20 (cut)
    with BuildSketch(Plane(origin=(0, -50, 0), x_dir=(1, 0, 0), z_dir=(0, 1, 0))):
        with Locations((14, -25.8)):
            Rectangle(SKETCH_30_W, SKETCH_30_H)
    extrude(amount=-CUT_EXTRUDE_20_DEPTH, mode=Mode.SUBTRACT)

    # 스케치31 → 보스-돌출10 (add)
    with BuildSketch(Plane(origin=(25, 0, 0), x_dir=(0, 0, -1), z_dir=(1, 0, 0))):
        with Locations((-19.3, -115)):
            Rectangle(SKETCH_31_W, SKETCH_31_H)
    extrude(amount=-EXTRUDE_10_DEPTH)

    # 스케치32 → 보스-돌출11 (add)
    with BuildSketch(Plane(origin=(3, 0, 0), x_dir=(0, 0, -1), z_dir=(1, 0, 0))):
        with Locations((-98.9, -24)):
            Rectangle(SKETCH_32_W, SKETCH_32_H)
    extrude(amount=-EXTRUDE_11_DEPTH)

    # 스케치35 → 보스-돌출14 (add)
    with BuildSketch(Plane(origin=(0, 2, 0), x_dir=(1, 0, 0), z_dir=(0, 1, 0))):
        Polygon((25, -20.8), (25, -17.8), (0, -17.8), (0, -180), (25, -180), (25, -177), (3, -177), (3, -20.8), align=None)
    extrude(amount=EXTRUDE_14_DEPTH)

    # 스케치36 → 보스-돌출15 (add)
    with BuildSketch(Plane(origin=(0, 7, 0), x_dir=(1, 0, 0), z_dir=(0, 1, 0))):
        with Locations((1.5, -98.9)):
            Rectangle(SKETCH_36_W, SKETCH_36_H)
    extrude(amount=EXTRUDE_15_DEPTH)

    # 스케치37 → 보스-돌출16 (add)
    with BuildSketch(Plane(origin=(0, 7, 0), x_dir=(1, 0, 0), z_dir=(0, 1, 0))):
        with Locations((28.5, -98.9)):
            Rectangle(SKETCH_37_W, SKETCH_37_H)
    extrude(amount=-EXTRUDE_16_DEPTH)

    # 스케치37<3> → 보스-돌출17 (add)
    with BuildSketch(Plane(origin=(0, 7, 0), x_dir=(1, 0, 0), z_dir=(0, 1, 0))):
        with Locations((41.5, -98.9)):
            Rectangle(SKETCH_37_3_W, SKETCH_37_3_H)
    extrude(amount=EXTRUDE_17_DEPTH)

    # 컷-돌출23 outline → 컷-돌출23 (cut)
    with BuildSketch(Plane(origin=(0, -50, 0), x_dir=(1, 0, 0), z_dir=(0, 1, 0)).offset(CUT_EXTRUDE_START)):
        with BuildLine():
            Line((4.75, -20.8), (5, -35.774937186))
            ThreePointArc((5, -35.774937186), (6.968337898, -41.392385725), (12.01238402, -44.552714963))
            ThreePointArc((12.01238402, -44.552714963), (12.003098405, -44.663653674), (12, -44.774937186))
            Line((12, -44.774937186), (12, -55))
            ThreePointArc((12, -55), (14, -57), (16, -55))
            Line((16, -55), (16, -44.774937186))
            ThreePointArc((16, -44.774937186), (15.996901595, -44.663653674), (15.98761598, -44.552714963))
            ThreePointArc((15.98761598, -44.552714963), (21.031662102, -41.392385725), (23, -35.774937186))
            Line((23, -35.774937186), (23.25, -20.8))
            Line((23.25, -20.8), (21.5, -20.8))
            Line((21.5, -20.8), (21.5, -30.8))
            Line((21.5, -30.8), (6.5, -30.8))
            Line((6.5, -30.8), (6.5, -20.8))
            Line((6.5, -20.8), (4.75, -20.8))
        make_face()
        with Locations((14, -69)):
            Circle(CUT_EXTRUDE_23_OUTLINE_R)
        with Locations((14, -153)):
            Circle(CUT_EXTRUDE_23_OUTLINE_R)
        with Locations((14, -139)):
            Circle(CUT_EXTRUDE_23_OUTLINE_R)
        with Locations((14, -125)):
            Circle(CUT_EXTRUDE_23_OUTLINE_R)
        with Locations((14, -111)):
            Circle(CUT_EXTRUDE_23_OUTLINE_R)
        with Locations((14, -97)):
            Circle(CUT_EXTRUDE_23_OUTLINE_R)
        with Locations((14, -83)):
            Circle(CUT_EXTRUDE_23_OUTLINE_R)
    extrude(amount=CUT_EXTRUDE_23_DEPTH, mode=Mode.SUBTRACT)

    # 스케치41 → 보스-돌출18 (add)
    with BuildSketch(Plane(origin=(0, 0, 17.8), x_dir=(-1, 0, 0), z_dir=(0, 0, -1))):
        Polygon((-40, 10), (-40, 12), (-38, 12), (-38, 11), (-37, 11), (-37, 14), (-43, 14), (-43, 10), align=None)
    extrude(amount=-EXTRUDE_18_DEPTH)

    # 스케치42 → 컷-돌출24 (cut)
    with BuildSketch(Plane(origin=(0, 27, 0), x_dir=(1, 0, 0), z_dir=(0, 1, 0))):
        with Locations((28.5, -98.9)):
            Rectangle(SKETCH_42_W, SKETCH_42_H)
    extrude(amount=-CUT_EXTRUDE_24_DEPTH, mode=Mode.SUBTRACT)

    # 스케치43 → 보스-돌출20 (add)
    with BuildSketch(Plane(origin=(0, 7, 0), x_dir=(1, 0, 0), z_dir=(0, 1, 0))):
        with Locations((8.5, -171)):
            Rectangle(SKETCH_43_W, SKETCH_43_H)
        with Locations((8.5, -26.8)):
            Rectangle(SKETCH_43_W, SKETCH_43_H)
    extrude(amount=-EXTRUDE_20_DEPTH)

    # 스케치44 → 컷-돌출26 (cut)
    with BuildSketch(Plane(origin=(3, 0, 0), x_dir=(0, 0, -1), z_dir=(1, 0, 0))):
        with Locations((-98.854230543, -92.5)):
            Rectangle(SKETCH_44_W, SKETCH_44_H)
        Polygon((-177, 24), (-20.8, 24), (-20.8, 17), (-35.8, 17), (-35.8, 1), (-23.8, 1), (-23.8, -47), (-174, -47), (-174, 1), (-162, 1), (-162, 17), (-177, 17), align=None)
    extrude(amount=-CUT_EXTRUDE_26_DEPTH, mode=Mode.SUBTRACT)

    # 스케치47 → 보스-돌출21 (add)
    with BuildSketch(Plane(origin=(3, 0, 0), x_dir=(0, 0, -1), z_dir=(1, 0, 0))):
        with Locations((-98.9, 20.5)):
            Rectangle(SKETCH_47_W, SKETCH_47_H)
    extrude(amount=-EXTRUDE_21_DEPTH)

    # 스케치48 → 보스-돌출22 (add)
    with BuildSketch(Plane.ZY):
        with Locations((29.8, -23)):
            Rectangle(SKETCH_48_W, SKETCH_48_H)
        with Locations((168, -23)):
            Rectangle(SKETCH_48_W, SKETCH_48_H)
        with Locations((29.8, -92.5)):
            Rectangle(SKETCH_48_W, SKETCH_48_H_2)
        with Locations((167.954230542, -92.5)):
            Rectangle(SKETCH_48_W_2, SKETCH_48_H_2)
    extrude(amount=-EXTRUDE_22_DEPTH)

    # 스케치49 → 보스-돌출23 (add)
    with BuildSketch(Plane(origin=(3, 0, 0), x_dir=(0, 0, -1), z_dir=(1, 0, 0))):
        with Locations((-98.9, -127.5)):
            Rectangle(SKETCH_49_W, SKETCH_49_H)
    extrude(amount=-EXTRUDE_23_DEPTH)


solid = Compound([part.part, body_2.part])
